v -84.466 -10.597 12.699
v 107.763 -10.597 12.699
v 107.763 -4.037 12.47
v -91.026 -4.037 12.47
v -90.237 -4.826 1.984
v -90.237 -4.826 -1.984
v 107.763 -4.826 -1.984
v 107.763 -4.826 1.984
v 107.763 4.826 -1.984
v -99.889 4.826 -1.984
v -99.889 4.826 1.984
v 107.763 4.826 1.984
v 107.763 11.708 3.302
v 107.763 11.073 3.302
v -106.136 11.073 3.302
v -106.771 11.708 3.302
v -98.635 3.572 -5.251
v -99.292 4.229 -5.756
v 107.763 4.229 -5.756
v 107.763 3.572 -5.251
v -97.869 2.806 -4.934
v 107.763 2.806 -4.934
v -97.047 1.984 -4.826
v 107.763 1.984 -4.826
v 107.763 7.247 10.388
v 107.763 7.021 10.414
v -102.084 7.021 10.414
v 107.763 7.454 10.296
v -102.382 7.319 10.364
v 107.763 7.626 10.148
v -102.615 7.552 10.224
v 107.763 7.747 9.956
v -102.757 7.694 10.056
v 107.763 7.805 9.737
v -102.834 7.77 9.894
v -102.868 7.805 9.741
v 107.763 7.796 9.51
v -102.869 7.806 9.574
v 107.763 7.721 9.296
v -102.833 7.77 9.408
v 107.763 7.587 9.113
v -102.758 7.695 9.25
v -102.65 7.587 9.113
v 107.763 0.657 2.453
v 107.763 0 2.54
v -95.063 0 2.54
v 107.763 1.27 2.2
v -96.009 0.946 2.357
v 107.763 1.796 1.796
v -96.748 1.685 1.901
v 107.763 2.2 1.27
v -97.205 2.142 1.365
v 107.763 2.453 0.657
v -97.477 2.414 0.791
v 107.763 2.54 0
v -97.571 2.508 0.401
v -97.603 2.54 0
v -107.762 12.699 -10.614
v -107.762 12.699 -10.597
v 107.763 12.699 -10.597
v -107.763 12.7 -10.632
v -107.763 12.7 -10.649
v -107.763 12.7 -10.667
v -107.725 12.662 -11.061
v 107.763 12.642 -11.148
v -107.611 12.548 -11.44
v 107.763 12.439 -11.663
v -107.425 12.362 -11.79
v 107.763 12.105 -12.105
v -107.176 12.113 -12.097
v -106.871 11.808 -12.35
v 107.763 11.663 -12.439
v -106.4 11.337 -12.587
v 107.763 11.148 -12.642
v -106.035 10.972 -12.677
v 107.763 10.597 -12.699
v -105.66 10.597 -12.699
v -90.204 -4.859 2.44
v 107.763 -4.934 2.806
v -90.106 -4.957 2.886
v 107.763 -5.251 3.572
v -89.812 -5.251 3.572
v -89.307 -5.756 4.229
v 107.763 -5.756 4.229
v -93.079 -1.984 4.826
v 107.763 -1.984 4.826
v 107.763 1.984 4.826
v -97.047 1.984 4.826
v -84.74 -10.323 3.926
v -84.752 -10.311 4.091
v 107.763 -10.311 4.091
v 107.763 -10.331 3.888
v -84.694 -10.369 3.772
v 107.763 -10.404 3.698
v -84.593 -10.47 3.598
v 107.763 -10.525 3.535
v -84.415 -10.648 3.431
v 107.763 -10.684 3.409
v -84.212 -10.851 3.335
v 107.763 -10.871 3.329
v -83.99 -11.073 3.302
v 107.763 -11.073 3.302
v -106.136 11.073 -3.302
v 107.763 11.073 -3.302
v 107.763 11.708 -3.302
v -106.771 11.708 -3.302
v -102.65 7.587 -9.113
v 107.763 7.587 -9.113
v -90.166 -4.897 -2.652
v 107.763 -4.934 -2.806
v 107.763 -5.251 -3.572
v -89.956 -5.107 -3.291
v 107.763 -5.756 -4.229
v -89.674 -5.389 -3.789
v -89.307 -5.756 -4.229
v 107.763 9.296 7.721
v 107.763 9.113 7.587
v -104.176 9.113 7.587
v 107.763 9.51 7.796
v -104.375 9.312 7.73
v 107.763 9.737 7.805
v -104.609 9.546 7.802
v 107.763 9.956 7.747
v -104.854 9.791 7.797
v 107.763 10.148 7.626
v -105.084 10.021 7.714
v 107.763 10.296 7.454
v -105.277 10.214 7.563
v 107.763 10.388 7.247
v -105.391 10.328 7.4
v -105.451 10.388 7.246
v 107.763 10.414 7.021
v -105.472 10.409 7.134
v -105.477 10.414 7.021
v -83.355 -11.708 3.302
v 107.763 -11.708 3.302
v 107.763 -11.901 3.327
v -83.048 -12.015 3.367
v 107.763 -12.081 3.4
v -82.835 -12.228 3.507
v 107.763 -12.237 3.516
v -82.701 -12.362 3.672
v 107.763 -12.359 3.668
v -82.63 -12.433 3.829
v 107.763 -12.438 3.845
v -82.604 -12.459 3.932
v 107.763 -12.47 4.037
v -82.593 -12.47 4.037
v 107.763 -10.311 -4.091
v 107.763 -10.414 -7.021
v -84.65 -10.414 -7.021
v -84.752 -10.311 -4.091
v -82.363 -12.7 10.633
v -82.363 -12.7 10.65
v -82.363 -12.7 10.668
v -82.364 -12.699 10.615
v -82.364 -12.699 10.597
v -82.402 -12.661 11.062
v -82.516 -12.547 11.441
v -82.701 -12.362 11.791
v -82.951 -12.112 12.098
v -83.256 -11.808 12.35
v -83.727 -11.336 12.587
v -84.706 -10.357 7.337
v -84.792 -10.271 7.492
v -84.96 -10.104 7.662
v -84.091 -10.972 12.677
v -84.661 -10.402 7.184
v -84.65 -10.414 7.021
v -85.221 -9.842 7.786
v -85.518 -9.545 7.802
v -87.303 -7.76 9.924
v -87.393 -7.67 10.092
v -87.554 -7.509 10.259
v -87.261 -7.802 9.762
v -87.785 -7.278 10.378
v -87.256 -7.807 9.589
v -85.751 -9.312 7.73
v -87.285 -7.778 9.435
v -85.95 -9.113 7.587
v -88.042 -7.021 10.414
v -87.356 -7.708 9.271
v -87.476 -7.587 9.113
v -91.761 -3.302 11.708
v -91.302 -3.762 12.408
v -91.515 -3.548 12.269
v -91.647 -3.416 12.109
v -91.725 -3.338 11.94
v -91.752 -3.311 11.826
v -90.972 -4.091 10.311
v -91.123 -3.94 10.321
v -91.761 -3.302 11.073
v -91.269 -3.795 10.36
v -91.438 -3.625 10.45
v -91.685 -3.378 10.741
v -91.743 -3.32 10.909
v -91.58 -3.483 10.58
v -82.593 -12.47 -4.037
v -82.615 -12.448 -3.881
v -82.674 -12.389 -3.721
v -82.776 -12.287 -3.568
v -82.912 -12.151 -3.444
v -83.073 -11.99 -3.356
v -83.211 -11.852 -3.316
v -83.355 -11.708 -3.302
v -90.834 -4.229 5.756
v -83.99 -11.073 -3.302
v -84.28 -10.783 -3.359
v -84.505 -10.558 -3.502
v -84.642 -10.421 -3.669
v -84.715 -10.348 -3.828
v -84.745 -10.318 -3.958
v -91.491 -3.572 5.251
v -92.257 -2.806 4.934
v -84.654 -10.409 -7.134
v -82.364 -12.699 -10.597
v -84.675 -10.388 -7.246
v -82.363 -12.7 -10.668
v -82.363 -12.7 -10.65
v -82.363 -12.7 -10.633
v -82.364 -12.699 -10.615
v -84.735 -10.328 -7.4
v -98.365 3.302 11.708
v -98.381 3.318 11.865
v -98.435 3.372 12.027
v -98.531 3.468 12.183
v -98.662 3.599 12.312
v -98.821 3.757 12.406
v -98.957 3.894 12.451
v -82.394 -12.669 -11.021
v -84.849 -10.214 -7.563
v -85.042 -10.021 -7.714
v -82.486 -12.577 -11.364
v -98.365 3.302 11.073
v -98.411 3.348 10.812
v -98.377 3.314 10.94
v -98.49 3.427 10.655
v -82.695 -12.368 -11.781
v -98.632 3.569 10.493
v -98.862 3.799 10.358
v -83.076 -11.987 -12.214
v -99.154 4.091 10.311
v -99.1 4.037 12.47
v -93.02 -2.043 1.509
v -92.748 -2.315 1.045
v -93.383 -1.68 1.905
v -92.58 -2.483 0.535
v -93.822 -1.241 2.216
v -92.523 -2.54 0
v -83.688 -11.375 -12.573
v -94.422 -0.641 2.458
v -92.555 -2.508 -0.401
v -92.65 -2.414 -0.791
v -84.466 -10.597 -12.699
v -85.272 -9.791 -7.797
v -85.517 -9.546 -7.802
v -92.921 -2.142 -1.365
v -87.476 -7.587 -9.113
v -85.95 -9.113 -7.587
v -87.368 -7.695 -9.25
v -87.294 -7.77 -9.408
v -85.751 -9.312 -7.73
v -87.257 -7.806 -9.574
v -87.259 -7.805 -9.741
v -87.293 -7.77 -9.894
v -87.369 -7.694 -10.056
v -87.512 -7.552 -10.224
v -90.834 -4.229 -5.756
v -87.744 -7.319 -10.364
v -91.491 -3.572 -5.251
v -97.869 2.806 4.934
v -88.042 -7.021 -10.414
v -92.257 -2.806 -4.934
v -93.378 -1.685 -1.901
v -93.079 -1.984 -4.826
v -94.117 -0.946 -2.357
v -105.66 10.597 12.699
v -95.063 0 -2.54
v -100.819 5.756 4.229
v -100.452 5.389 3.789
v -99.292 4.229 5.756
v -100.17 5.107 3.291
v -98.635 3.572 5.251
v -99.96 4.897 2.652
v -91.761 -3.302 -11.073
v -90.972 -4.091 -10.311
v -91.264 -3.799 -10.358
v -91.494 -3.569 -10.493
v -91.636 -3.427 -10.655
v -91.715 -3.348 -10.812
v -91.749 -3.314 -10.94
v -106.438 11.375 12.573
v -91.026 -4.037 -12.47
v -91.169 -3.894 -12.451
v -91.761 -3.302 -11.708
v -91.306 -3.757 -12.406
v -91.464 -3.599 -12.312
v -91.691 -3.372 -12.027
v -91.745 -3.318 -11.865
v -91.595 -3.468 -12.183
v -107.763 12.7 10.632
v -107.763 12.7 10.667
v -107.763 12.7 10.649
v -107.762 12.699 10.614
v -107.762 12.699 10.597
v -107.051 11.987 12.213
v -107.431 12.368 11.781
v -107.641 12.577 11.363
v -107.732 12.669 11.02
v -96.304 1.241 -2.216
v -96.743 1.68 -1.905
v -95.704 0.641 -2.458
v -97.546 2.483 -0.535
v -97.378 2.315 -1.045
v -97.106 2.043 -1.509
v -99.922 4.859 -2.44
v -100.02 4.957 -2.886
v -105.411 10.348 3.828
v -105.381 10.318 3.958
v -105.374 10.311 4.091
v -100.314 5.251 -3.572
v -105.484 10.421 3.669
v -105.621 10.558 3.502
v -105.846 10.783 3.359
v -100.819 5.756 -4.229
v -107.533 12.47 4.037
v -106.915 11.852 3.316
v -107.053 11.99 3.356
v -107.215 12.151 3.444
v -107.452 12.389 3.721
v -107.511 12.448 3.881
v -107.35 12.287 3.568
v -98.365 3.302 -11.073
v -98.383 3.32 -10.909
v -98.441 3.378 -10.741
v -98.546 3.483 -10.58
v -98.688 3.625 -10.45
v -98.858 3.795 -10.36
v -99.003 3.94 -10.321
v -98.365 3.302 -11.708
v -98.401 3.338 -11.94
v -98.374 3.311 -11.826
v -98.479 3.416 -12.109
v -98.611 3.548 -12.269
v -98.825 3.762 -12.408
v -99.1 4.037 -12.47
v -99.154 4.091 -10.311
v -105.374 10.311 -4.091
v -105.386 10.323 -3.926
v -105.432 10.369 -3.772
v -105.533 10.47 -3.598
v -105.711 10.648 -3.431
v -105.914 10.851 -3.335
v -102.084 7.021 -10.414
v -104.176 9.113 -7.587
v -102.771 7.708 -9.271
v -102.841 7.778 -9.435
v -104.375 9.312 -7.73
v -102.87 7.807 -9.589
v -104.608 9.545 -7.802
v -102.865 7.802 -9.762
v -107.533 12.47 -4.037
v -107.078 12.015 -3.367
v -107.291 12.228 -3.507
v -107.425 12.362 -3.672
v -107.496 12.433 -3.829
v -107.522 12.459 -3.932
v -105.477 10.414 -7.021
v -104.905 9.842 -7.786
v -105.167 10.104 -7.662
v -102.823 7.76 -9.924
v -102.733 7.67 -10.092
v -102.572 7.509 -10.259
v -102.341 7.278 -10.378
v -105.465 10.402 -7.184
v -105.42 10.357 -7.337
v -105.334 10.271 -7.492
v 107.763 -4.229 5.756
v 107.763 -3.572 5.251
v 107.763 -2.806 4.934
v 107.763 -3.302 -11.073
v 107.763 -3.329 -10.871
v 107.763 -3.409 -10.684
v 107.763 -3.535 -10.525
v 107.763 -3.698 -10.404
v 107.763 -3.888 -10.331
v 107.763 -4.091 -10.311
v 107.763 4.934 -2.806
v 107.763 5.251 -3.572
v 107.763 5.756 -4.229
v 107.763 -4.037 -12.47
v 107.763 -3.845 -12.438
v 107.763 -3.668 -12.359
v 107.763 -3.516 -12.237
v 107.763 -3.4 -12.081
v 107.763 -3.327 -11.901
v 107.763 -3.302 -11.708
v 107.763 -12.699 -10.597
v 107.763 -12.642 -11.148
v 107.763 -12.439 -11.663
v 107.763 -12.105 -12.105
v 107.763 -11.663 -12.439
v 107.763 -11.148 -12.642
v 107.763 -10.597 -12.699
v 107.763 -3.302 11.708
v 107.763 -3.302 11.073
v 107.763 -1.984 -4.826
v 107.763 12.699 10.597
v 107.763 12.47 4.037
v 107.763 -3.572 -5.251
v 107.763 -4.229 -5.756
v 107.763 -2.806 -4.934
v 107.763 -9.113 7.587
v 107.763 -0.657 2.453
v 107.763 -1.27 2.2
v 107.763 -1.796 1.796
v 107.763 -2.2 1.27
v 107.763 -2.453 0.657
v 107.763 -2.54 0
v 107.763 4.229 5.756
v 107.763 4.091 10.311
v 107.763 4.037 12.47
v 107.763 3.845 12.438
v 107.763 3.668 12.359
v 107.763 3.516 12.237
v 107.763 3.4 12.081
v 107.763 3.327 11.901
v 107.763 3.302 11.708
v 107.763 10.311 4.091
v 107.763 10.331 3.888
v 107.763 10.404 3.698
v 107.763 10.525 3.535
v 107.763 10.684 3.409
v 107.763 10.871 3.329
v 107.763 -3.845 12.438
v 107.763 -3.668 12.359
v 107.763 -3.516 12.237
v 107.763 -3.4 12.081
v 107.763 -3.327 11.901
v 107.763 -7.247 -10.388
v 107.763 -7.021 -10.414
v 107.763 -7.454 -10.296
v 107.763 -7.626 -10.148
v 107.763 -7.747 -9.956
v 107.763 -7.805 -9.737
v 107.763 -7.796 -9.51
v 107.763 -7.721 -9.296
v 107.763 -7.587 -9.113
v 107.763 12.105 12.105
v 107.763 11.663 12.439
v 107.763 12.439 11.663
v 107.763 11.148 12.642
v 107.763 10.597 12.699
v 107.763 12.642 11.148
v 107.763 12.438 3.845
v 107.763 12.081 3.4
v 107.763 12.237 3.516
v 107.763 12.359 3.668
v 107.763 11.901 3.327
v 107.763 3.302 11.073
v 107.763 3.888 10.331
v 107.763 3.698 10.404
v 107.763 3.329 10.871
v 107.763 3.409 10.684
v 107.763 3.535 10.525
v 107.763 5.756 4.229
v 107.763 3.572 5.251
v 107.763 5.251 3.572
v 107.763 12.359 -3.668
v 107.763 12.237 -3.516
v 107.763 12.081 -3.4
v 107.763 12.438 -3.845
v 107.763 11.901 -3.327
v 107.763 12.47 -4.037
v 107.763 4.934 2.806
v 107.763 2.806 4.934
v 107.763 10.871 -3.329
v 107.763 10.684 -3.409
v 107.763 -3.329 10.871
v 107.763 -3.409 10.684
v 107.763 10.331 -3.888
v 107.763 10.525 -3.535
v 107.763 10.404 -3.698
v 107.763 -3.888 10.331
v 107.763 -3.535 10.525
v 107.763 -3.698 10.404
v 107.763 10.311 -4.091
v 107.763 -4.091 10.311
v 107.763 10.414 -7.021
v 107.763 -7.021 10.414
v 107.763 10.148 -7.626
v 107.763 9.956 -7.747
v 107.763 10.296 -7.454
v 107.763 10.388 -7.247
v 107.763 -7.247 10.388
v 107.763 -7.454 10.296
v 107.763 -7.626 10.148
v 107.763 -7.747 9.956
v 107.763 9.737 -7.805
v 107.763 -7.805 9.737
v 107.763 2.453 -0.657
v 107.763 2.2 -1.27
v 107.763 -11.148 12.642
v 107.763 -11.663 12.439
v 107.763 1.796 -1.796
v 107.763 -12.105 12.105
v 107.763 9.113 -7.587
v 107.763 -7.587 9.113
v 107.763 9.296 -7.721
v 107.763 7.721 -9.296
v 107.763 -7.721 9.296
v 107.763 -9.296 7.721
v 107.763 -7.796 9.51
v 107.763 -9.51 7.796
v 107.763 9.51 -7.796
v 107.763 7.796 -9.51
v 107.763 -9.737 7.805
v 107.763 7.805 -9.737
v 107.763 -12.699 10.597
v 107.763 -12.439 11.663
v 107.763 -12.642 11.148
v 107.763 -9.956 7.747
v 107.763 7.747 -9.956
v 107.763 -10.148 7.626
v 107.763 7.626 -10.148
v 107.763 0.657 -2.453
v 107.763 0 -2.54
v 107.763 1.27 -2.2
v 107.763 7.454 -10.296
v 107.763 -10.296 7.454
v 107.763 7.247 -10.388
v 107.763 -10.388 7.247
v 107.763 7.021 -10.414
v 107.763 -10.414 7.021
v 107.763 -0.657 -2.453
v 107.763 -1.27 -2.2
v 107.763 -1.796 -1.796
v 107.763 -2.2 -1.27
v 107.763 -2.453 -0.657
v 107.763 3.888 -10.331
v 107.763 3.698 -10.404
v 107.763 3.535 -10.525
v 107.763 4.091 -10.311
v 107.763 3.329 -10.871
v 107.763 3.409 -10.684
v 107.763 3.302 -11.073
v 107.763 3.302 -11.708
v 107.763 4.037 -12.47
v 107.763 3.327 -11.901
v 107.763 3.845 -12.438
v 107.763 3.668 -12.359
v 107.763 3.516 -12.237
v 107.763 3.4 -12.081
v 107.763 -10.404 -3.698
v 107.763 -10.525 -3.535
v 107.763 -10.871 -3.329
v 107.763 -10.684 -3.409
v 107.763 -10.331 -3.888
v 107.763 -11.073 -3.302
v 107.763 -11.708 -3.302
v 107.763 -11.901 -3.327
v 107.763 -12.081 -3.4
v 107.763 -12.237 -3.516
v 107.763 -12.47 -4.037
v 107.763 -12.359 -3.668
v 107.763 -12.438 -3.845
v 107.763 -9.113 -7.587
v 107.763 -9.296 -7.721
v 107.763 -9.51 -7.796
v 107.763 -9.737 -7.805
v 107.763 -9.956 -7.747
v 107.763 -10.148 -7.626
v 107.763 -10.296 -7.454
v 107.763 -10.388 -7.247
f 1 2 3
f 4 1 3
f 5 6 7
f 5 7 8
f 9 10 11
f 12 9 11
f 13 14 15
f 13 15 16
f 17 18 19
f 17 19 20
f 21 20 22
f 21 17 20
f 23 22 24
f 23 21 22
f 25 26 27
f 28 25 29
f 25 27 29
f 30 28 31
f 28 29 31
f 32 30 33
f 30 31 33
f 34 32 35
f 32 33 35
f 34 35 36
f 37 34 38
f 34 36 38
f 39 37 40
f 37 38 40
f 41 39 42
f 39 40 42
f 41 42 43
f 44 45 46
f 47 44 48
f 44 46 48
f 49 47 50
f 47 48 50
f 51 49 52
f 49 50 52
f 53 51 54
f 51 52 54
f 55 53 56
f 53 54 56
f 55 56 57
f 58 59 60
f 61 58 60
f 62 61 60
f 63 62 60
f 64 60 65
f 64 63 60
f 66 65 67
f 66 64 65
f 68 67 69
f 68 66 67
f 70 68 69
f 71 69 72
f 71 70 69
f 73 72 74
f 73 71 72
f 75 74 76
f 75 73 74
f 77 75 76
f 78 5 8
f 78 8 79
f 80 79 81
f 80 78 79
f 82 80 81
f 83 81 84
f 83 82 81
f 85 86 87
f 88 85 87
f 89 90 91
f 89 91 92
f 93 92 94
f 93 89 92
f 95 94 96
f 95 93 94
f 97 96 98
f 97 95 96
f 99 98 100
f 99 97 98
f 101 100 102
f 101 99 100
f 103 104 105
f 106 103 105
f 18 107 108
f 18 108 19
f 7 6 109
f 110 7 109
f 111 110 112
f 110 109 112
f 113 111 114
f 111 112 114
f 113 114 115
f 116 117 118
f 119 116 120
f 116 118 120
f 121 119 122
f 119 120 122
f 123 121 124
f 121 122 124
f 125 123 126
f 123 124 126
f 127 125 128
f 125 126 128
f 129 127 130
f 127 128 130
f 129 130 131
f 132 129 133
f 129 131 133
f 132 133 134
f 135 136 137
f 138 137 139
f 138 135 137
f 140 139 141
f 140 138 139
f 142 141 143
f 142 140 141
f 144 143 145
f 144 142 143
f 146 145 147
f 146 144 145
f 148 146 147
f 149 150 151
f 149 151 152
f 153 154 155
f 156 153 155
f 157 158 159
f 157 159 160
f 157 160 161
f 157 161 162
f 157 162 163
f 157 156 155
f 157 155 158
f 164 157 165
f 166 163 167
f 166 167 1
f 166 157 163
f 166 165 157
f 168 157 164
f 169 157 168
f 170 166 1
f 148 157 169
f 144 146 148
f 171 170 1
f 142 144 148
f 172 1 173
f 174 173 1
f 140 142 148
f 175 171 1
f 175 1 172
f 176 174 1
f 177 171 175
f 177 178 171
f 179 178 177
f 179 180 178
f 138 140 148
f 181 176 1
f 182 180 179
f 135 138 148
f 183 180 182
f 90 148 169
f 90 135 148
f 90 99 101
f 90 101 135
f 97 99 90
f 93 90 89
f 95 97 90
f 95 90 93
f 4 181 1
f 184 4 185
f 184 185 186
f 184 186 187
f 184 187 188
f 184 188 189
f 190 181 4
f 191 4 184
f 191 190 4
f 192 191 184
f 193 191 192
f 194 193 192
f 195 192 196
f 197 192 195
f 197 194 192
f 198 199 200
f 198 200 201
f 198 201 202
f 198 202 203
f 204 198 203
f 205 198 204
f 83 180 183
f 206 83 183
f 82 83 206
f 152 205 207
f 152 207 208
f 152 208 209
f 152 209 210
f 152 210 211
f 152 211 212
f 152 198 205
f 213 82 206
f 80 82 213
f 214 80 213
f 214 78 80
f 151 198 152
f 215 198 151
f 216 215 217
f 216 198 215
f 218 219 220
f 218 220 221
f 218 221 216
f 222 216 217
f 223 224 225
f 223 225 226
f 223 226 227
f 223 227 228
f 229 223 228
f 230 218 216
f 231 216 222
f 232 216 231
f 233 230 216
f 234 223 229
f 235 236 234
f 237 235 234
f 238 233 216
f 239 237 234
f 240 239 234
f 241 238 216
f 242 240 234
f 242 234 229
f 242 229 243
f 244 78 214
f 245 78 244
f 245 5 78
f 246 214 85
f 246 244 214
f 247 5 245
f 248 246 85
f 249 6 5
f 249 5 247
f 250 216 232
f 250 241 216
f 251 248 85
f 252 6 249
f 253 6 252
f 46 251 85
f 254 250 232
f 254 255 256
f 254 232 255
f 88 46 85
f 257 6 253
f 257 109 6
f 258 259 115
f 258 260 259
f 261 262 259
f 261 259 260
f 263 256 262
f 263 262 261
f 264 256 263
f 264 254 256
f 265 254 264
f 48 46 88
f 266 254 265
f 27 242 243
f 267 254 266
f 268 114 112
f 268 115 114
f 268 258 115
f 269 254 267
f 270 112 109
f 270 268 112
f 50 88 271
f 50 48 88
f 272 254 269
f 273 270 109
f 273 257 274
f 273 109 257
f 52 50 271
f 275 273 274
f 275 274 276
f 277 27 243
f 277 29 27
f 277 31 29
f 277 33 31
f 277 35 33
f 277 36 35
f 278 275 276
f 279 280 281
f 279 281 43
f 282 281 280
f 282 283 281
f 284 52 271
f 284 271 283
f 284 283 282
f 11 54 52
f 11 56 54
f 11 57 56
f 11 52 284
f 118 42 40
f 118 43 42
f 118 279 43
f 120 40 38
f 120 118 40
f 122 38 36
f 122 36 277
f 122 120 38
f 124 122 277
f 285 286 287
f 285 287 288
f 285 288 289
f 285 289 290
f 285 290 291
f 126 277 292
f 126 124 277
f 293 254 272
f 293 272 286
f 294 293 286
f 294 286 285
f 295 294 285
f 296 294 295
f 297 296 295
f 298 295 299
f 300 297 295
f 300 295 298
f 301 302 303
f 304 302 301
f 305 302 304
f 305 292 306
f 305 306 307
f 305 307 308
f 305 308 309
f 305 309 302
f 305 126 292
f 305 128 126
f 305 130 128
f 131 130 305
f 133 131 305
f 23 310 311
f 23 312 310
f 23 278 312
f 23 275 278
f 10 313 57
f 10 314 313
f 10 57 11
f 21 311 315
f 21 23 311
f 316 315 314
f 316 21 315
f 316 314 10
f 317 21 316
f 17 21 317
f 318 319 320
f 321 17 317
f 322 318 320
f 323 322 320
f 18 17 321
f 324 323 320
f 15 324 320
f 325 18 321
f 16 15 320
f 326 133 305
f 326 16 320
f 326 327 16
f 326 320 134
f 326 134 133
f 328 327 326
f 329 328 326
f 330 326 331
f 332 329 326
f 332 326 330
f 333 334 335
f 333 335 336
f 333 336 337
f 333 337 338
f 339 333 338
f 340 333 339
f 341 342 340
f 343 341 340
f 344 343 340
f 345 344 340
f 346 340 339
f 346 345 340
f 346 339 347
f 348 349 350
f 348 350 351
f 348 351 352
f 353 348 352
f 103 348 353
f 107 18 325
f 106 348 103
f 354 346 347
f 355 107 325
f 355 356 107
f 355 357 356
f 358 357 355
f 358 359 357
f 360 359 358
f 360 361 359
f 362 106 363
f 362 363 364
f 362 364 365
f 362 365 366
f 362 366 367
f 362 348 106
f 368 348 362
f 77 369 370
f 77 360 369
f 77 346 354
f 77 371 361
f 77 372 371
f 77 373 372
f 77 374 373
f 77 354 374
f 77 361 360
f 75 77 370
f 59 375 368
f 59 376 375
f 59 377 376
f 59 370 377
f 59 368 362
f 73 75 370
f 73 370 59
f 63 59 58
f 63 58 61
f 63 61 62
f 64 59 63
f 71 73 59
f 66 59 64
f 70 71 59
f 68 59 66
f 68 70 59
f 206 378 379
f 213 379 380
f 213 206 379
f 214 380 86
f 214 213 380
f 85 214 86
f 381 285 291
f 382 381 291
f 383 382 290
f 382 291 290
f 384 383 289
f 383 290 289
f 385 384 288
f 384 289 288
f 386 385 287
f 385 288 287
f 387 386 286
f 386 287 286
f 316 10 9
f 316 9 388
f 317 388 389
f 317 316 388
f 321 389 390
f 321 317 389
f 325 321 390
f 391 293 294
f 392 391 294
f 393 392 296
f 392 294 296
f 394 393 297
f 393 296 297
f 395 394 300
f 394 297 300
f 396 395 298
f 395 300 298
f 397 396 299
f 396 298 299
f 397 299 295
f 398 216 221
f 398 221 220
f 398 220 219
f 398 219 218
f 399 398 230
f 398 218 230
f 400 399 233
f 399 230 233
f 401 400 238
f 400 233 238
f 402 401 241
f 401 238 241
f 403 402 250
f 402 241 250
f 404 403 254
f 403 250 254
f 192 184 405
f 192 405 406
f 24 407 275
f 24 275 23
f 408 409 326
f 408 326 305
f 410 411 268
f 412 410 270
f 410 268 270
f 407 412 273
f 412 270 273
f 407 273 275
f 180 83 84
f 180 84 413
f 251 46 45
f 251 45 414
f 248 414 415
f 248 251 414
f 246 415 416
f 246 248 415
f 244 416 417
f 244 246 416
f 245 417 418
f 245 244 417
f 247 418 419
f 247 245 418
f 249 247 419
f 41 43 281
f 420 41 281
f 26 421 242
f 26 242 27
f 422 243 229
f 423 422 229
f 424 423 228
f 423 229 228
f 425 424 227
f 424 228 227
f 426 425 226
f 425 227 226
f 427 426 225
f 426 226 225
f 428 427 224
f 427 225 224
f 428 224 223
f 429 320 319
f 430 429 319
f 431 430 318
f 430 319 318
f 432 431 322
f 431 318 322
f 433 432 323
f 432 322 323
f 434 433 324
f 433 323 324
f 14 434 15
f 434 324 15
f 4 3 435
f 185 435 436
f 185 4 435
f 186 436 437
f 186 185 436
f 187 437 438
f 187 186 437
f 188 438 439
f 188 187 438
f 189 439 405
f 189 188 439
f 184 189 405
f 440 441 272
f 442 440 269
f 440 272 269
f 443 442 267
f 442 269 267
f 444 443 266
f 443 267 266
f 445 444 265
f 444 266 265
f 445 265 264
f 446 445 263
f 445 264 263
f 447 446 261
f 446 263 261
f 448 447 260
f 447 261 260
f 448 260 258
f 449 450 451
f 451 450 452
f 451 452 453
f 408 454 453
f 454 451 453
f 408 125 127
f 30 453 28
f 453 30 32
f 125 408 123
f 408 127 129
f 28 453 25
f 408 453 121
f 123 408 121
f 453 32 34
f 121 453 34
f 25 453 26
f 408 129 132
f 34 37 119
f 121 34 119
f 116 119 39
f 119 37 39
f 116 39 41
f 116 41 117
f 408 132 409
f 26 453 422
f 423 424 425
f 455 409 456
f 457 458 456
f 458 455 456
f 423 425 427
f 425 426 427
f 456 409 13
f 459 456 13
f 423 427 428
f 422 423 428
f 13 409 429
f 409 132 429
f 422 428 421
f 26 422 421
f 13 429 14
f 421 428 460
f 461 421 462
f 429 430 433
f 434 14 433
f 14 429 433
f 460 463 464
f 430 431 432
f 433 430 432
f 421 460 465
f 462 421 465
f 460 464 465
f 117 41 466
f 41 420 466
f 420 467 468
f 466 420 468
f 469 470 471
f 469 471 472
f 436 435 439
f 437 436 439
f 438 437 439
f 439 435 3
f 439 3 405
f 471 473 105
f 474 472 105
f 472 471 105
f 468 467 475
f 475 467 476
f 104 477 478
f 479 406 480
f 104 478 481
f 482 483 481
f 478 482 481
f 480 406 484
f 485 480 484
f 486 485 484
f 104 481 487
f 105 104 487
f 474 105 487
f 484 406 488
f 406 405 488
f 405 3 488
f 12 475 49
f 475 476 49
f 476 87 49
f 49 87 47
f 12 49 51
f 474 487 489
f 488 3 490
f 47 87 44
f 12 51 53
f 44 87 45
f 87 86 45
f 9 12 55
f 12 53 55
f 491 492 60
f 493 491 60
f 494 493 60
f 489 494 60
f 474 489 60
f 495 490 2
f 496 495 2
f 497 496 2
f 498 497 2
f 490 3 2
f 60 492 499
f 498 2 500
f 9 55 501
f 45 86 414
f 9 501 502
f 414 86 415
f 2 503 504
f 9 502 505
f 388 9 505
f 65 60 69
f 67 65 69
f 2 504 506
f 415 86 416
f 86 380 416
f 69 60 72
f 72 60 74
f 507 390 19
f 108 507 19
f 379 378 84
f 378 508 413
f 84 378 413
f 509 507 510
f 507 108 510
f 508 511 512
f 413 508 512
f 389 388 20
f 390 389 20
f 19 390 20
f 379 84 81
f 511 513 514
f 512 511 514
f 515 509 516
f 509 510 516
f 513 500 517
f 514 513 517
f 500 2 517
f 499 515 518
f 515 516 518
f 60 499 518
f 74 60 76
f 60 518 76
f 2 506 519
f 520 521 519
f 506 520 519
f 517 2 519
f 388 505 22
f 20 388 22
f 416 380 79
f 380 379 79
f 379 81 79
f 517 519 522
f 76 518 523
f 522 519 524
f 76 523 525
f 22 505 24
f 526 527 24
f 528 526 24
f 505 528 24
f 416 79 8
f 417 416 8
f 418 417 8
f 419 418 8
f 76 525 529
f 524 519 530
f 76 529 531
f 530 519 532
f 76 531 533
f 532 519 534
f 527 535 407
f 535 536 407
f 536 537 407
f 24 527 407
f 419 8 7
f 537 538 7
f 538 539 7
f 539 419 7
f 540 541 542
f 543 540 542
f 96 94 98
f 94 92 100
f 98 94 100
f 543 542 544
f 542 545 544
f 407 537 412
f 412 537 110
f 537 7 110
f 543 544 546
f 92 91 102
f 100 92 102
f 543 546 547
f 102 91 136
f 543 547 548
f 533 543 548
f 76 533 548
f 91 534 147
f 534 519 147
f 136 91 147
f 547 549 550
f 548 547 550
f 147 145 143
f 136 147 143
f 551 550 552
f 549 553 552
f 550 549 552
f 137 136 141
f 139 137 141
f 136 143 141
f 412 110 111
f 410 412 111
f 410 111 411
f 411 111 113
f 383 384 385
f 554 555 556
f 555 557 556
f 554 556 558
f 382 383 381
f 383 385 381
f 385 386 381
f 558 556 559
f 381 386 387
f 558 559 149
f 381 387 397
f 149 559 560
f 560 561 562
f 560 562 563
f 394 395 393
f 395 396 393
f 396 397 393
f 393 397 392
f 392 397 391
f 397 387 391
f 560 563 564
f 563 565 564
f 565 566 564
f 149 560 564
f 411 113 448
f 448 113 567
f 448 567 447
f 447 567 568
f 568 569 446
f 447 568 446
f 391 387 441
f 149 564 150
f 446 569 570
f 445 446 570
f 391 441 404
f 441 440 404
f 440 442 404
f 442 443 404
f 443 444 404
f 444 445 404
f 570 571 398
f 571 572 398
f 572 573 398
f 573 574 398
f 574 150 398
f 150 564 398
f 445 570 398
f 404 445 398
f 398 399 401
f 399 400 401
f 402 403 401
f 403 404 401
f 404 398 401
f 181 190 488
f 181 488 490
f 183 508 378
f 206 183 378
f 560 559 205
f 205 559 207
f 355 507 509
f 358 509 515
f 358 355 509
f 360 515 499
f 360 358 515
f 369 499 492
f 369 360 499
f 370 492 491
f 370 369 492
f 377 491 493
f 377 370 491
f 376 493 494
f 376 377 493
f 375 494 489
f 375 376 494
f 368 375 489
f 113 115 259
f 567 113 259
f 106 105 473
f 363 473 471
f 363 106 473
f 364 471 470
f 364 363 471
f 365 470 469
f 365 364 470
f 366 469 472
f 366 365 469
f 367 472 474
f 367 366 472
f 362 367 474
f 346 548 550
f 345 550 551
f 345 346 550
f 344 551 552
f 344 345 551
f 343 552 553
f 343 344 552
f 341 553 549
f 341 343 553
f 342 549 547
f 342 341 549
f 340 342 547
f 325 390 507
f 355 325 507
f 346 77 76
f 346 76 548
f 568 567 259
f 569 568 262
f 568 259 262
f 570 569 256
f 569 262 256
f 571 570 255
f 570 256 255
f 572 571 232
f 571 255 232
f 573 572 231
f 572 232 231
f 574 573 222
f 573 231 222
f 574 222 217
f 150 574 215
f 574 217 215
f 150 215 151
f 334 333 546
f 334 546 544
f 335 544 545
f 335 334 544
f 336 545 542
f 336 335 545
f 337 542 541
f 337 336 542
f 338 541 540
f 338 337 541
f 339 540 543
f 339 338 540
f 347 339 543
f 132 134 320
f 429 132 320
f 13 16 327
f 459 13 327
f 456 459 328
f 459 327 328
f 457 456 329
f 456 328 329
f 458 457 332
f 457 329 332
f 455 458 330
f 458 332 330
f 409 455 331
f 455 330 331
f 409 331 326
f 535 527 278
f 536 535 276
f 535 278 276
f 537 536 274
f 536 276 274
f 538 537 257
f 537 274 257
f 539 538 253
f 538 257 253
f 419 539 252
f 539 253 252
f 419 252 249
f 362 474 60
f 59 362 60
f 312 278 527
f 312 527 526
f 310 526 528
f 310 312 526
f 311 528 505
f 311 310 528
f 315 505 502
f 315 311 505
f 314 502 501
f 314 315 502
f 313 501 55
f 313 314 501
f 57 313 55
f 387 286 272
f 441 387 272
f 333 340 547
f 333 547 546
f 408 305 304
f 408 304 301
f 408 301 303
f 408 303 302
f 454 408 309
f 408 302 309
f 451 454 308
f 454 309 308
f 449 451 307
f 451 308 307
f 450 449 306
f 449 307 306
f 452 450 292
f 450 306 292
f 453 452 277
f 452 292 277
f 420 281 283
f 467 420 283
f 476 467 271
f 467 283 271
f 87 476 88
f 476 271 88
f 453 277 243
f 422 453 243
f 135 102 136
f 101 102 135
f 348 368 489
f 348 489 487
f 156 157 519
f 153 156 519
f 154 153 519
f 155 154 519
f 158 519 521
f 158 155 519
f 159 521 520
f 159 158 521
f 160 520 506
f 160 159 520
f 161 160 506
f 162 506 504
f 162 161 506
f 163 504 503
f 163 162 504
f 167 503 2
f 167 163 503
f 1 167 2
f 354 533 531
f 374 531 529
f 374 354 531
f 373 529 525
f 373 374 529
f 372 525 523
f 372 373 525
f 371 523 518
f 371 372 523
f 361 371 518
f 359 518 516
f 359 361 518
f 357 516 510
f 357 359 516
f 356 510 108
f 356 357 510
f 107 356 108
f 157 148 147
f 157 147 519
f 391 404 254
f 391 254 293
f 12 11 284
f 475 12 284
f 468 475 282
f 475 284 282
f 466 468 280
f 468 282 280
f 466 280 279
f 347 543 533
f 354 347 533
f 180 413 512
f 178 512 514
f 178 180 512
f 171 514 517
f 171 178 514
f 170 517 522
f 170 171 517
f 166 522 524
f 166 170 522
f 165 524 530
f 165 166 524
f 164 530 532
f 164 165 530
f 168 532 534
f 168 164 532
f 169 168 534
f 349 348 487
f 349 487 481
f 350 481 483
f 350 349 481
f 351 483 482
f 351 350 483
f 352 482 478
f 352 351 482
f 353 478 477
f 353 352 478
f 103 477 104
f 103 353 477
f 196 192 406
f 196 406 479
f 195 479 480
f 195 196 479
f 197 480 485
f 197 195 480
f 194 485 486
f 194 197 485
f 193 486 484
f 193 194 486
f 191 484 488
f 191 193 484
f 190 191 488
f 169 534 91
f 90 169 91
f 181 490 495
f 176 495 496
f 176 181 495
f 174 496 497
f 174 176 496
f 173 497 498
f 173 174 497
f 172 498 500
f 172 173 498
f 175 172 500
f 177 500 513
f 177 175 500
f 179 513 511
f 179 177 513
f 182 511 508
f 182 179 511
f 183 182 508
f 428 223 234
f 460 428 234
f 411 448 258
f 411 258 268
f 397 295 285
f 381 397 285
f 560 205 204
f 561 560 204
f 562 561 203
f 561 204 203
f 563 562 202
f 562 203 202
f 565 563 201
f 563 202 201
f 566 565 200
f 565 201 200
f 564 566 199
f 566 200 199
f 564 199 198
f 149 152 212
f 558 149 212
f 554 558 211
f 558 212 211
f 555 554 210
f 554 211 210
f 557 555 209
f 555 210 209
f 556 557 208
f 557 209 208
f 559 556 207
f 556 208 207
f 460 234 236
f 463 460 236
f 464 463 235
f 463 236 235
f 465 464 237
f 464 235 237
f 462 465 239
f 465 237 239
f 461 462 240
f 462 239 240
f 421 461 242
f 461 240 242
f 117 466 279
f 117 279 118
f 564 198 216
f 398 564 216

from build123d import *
from OCP.BRepAlgoAPI import BRepAlgoAPI_Cut
from OCP.TopTools import TopTools_ListOfShape

# Parameters (mm, degrees)
BOSS_EXTRUDE1_DEPTH      = 107.763073
BOSS_EXTRUDE1_DEPTH_BACK = 107.763073
CUT_EXTRUDE1_DEPTH       = 112.441765159
CUT_EXTRUDE1_DEPTH_BACK  = 112.441765159


with BuildPart() as part:
    # Sketch3 → Boss-Extrude1 (new, two sides: drawn at the far end of the back side and taken through both)
    with BuildSketch(Plane(origin=(0, 0, 0), x_dir=(0, 0, -1), z_dir=(1, 0, 0)).offset(-BOSS_EXTRUDE1_DEPTH_BACK)):
        with BuildLine():
            Line((0, 4.826), (1.984228399, 4.826))
            ThreePointArc((1.984228399, 4.826), (3.199248297, 5.067682484), (4.229292429, 5.75593597))
            Line((4.229292429, 5.75593597), (7.586577723, 9.113221264))
            ThreePointArc((7.586577723, 9.113221264), (7.746562132, 9.955883421), (7.021168939, 10.413572441))
            Line((7.021168939, 10.413572441), (4.090593416, 10.311234489))
            ThreePointArc((4.090593416, 10.311234489), (3.534670322, 10.524633371), (3.302, 11.072770299))
            Line((3.302, 11.072770299), (3.302, 11.70815736))
            ThreePointArc((3.302, 11.70815736), (3.515863072, 12.237487038), (4.037406584, 12.46969317))
            Line((4.037406584, 12.46969317), (10.597084223, 12.698762161))
            ThreePointArc((10.597084223, 12.698762161), (12.104840979, 12.104840979), (12.698762161, 10.597084223))
            Line((12.698762161, 10.597084223), (12.46969317, 4.037406584))
            ThreePointArc((12.46969317, 4.037406584), (12.237487038, 3.515863072), (11.70815736, 3.302))
            Line((11.70815736, 3.302), (11.072770299, 3.302))
            ThreePointArc((11.072770299, 3.302), (10.524633371, 3.534670322), (10.311234489, 4.090593416))
            Line((10.311234489, 4.090593416), (10.413572441, 7.021168939))
            ThreePointArc((10.413572441, 7.021168939), (9.955883421, 7.746562132), (9.113221264, 7.586577723))
            Line((9.113221264, 7.586577723), (5.75593597, 4.229292429))
            ThreePointArc((5.75593597, 4.229292429), (5.067682484, 3.199248297), (4.826, 1.984228399))
            Line((4.826, 1.984228399), (4.826, 0))
            Line((4.826, 0), (2.54, 0))
            ThreePointArc((2.54, 0), (1.796051224, 1.796051224), (0, 2.54))
            Line((0, 2.54), (0, 4.826))
        make_face()
    extrude(amount=BOSS_EXTRUDE1_DEPTH + BOSS_EXTRUDE1_DEPTH_BACK)

    # Mirror1: part across plane


with BuildPart() as part_1:
    add(part.part)
    add(part.part.mirror(Plane.ZX))

    # Mirror2: part across plane


with BuildPart() as part_2:
    add(part_1.part)
    add(part_1.part.mirror(Plane.XY))


with BuildPart() as cut_extrude1_tool:
    # Sketch5 → Cut-Extrude1 (new, two sides: drawn at the far end of the back side and taken through both)
    with BuildSketch(Plane.XY.offset(12.698762161).offset(-CUT_EXTRUDE1_DEPTH_BACK)):
        Polygon((-551.798462655, -12.7), (-107.763073399, -12.7), (-82.363073399, -12.7), (-107.763073399, 12.7), (-421.743508229, 326.68043483), (-1251.009529162, 644.465856414), (-1381.064483588, 305.085421584), align=None)
    extrude(amount=CUT_EXTRUDE1_DEPTH + CUT_EXTRUDE1_DEPTH_BACK)


with BuildPart() as part_3:
    add(part_2.part)

    # Cut-Extrude1: cut by cut_extrude1_tool, with a tolerance
    cut_extrude1_stock = TopTools_ListOfShape()
    cut_extrude1_stock.Append(part_3.part.wrapped)
    cut_extrude1_tools = TopTools_ListOfShape()
    cut_extrude1_tools.Append(cut_extrude1_tool.part.wrapped)
    cut_extrude1_cut = BRepAlgoAPI_Cut()
    cut_extrude1_cut.SetArguments(cut_extrude1_stock)
    cut_extrude1_cut.SetTools(cut_extrude1_tools)
    cut_extrude1_cut.SetFuzzyValue(0.00001)
    cut_extrude1_cut.Build()
    add(Compound.cast(cut_extrude1_cut.Shape()).solids(), mode=Mode.REPLACE)


solid = part_3.part
